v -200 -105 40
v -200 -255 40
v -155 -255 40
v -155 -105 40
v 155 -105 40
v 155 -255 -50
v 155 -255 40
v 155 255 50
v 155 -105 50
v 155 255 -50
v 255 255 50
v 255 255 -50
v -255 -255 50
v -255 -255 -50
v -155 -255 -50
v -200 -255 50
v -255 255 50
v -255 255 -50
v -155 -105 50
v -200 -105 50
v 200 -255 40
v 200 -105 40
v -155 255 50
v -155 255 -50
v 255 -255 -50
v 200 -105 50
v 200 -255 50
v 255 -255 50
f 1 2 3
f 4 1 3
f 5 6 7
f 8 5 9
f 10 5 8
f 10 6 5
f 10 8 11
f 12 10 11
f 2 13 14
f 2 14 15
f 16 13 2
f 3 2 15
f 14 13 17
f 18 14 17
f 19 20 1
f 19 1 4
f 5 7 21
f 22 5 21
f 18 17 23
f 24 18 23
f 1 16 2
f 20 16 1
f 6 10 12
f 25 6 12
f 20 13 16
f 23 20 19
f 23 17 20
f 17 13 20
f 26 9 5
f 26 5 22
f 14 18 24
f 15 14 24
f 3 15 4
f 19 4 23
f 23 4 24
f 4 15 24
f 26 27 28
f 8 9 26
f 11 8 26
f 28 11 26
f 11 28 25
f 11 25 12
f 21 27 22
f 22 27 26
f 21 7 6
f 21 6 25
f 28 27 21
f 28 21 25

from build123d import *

# Parameters (mm, degrees)
SKETCH1_W           = 510
SKETCH1_H           = 510
SKETCH1_W_2         = 310
SKETCH1_H_2         = 310
BOSS_EXTRUDE1_DEPTH = 50
SKETCH2_W           = 400
SKETCH2_H           = 150
CUT_EXTRUDE1_DEPTH  = 10
SKETCH3_W           = 310
SKETCH3_H           = 100
CUT_EXTRUDE2_DEPTH  = 375.232548023


with BuildPart() as part:
    # Sketch1 → Boss-Extrude1 (new, symmetric)
    with BuildSketch(Plane.XY):
        Rectangle(SKETCH1_W, SKETCH1_H)
        Rectangle(SKETCH1_W_2, SKETCH1_H_2, mode=Mode.SUBTRACT)
    extrude(amount=BOSS_EXTRUDE1_DEPTH, both=True)

    # Sketch2 → Cut-Extrude1 (cut)
    with BuildSketch(Plane.XY.offset(50)):
        with Locations((0, -180)):
            Rectangle(SKETCH2_W, SKETCH2_H)
    extrude(amount=-CUT_EXTRUDE1_DEPTH, mode=Mode.SUBTRACT)

    # Sketch3 → Cut-Extrude2 (cut, through all)
    with BuildSketch(Plane(origin=(0, 0, -50), x_dir=(-1, 0, 0), z_dir=(0, 0, -1))):
        with Locations((0, -205)):
            Rectangle(SKETCH3_W, SKETCH3_H)
        with Locations((0, 205)):
            Rectangle(SKETCH3_W, SKETCH3_H)
    extrude(amount=-CUT_EXTRUDE2_DEPTH, mode=Mode.SUBTRACT)


with BuildPart() as cut_extrude2_piece_1:
    # of the separate pieces the step leaves, piece 1, a body of its own (cut_extrude2_pieces)
    add(part.part.solids().sort_by_distance((-255, 255, -50))[0])


with BuildPart() as cut_extrude2_piece_2:
    # of the separate pieces the step leaves, piece 2, a body of its own (cut_extrude2_pieces)
    add(part.part.solids().sort_by_distance((155, 255, -50))[0])


solid = Compound([cut_extrude2_piece_1.part, cut_extrude2_piece_2.part])
